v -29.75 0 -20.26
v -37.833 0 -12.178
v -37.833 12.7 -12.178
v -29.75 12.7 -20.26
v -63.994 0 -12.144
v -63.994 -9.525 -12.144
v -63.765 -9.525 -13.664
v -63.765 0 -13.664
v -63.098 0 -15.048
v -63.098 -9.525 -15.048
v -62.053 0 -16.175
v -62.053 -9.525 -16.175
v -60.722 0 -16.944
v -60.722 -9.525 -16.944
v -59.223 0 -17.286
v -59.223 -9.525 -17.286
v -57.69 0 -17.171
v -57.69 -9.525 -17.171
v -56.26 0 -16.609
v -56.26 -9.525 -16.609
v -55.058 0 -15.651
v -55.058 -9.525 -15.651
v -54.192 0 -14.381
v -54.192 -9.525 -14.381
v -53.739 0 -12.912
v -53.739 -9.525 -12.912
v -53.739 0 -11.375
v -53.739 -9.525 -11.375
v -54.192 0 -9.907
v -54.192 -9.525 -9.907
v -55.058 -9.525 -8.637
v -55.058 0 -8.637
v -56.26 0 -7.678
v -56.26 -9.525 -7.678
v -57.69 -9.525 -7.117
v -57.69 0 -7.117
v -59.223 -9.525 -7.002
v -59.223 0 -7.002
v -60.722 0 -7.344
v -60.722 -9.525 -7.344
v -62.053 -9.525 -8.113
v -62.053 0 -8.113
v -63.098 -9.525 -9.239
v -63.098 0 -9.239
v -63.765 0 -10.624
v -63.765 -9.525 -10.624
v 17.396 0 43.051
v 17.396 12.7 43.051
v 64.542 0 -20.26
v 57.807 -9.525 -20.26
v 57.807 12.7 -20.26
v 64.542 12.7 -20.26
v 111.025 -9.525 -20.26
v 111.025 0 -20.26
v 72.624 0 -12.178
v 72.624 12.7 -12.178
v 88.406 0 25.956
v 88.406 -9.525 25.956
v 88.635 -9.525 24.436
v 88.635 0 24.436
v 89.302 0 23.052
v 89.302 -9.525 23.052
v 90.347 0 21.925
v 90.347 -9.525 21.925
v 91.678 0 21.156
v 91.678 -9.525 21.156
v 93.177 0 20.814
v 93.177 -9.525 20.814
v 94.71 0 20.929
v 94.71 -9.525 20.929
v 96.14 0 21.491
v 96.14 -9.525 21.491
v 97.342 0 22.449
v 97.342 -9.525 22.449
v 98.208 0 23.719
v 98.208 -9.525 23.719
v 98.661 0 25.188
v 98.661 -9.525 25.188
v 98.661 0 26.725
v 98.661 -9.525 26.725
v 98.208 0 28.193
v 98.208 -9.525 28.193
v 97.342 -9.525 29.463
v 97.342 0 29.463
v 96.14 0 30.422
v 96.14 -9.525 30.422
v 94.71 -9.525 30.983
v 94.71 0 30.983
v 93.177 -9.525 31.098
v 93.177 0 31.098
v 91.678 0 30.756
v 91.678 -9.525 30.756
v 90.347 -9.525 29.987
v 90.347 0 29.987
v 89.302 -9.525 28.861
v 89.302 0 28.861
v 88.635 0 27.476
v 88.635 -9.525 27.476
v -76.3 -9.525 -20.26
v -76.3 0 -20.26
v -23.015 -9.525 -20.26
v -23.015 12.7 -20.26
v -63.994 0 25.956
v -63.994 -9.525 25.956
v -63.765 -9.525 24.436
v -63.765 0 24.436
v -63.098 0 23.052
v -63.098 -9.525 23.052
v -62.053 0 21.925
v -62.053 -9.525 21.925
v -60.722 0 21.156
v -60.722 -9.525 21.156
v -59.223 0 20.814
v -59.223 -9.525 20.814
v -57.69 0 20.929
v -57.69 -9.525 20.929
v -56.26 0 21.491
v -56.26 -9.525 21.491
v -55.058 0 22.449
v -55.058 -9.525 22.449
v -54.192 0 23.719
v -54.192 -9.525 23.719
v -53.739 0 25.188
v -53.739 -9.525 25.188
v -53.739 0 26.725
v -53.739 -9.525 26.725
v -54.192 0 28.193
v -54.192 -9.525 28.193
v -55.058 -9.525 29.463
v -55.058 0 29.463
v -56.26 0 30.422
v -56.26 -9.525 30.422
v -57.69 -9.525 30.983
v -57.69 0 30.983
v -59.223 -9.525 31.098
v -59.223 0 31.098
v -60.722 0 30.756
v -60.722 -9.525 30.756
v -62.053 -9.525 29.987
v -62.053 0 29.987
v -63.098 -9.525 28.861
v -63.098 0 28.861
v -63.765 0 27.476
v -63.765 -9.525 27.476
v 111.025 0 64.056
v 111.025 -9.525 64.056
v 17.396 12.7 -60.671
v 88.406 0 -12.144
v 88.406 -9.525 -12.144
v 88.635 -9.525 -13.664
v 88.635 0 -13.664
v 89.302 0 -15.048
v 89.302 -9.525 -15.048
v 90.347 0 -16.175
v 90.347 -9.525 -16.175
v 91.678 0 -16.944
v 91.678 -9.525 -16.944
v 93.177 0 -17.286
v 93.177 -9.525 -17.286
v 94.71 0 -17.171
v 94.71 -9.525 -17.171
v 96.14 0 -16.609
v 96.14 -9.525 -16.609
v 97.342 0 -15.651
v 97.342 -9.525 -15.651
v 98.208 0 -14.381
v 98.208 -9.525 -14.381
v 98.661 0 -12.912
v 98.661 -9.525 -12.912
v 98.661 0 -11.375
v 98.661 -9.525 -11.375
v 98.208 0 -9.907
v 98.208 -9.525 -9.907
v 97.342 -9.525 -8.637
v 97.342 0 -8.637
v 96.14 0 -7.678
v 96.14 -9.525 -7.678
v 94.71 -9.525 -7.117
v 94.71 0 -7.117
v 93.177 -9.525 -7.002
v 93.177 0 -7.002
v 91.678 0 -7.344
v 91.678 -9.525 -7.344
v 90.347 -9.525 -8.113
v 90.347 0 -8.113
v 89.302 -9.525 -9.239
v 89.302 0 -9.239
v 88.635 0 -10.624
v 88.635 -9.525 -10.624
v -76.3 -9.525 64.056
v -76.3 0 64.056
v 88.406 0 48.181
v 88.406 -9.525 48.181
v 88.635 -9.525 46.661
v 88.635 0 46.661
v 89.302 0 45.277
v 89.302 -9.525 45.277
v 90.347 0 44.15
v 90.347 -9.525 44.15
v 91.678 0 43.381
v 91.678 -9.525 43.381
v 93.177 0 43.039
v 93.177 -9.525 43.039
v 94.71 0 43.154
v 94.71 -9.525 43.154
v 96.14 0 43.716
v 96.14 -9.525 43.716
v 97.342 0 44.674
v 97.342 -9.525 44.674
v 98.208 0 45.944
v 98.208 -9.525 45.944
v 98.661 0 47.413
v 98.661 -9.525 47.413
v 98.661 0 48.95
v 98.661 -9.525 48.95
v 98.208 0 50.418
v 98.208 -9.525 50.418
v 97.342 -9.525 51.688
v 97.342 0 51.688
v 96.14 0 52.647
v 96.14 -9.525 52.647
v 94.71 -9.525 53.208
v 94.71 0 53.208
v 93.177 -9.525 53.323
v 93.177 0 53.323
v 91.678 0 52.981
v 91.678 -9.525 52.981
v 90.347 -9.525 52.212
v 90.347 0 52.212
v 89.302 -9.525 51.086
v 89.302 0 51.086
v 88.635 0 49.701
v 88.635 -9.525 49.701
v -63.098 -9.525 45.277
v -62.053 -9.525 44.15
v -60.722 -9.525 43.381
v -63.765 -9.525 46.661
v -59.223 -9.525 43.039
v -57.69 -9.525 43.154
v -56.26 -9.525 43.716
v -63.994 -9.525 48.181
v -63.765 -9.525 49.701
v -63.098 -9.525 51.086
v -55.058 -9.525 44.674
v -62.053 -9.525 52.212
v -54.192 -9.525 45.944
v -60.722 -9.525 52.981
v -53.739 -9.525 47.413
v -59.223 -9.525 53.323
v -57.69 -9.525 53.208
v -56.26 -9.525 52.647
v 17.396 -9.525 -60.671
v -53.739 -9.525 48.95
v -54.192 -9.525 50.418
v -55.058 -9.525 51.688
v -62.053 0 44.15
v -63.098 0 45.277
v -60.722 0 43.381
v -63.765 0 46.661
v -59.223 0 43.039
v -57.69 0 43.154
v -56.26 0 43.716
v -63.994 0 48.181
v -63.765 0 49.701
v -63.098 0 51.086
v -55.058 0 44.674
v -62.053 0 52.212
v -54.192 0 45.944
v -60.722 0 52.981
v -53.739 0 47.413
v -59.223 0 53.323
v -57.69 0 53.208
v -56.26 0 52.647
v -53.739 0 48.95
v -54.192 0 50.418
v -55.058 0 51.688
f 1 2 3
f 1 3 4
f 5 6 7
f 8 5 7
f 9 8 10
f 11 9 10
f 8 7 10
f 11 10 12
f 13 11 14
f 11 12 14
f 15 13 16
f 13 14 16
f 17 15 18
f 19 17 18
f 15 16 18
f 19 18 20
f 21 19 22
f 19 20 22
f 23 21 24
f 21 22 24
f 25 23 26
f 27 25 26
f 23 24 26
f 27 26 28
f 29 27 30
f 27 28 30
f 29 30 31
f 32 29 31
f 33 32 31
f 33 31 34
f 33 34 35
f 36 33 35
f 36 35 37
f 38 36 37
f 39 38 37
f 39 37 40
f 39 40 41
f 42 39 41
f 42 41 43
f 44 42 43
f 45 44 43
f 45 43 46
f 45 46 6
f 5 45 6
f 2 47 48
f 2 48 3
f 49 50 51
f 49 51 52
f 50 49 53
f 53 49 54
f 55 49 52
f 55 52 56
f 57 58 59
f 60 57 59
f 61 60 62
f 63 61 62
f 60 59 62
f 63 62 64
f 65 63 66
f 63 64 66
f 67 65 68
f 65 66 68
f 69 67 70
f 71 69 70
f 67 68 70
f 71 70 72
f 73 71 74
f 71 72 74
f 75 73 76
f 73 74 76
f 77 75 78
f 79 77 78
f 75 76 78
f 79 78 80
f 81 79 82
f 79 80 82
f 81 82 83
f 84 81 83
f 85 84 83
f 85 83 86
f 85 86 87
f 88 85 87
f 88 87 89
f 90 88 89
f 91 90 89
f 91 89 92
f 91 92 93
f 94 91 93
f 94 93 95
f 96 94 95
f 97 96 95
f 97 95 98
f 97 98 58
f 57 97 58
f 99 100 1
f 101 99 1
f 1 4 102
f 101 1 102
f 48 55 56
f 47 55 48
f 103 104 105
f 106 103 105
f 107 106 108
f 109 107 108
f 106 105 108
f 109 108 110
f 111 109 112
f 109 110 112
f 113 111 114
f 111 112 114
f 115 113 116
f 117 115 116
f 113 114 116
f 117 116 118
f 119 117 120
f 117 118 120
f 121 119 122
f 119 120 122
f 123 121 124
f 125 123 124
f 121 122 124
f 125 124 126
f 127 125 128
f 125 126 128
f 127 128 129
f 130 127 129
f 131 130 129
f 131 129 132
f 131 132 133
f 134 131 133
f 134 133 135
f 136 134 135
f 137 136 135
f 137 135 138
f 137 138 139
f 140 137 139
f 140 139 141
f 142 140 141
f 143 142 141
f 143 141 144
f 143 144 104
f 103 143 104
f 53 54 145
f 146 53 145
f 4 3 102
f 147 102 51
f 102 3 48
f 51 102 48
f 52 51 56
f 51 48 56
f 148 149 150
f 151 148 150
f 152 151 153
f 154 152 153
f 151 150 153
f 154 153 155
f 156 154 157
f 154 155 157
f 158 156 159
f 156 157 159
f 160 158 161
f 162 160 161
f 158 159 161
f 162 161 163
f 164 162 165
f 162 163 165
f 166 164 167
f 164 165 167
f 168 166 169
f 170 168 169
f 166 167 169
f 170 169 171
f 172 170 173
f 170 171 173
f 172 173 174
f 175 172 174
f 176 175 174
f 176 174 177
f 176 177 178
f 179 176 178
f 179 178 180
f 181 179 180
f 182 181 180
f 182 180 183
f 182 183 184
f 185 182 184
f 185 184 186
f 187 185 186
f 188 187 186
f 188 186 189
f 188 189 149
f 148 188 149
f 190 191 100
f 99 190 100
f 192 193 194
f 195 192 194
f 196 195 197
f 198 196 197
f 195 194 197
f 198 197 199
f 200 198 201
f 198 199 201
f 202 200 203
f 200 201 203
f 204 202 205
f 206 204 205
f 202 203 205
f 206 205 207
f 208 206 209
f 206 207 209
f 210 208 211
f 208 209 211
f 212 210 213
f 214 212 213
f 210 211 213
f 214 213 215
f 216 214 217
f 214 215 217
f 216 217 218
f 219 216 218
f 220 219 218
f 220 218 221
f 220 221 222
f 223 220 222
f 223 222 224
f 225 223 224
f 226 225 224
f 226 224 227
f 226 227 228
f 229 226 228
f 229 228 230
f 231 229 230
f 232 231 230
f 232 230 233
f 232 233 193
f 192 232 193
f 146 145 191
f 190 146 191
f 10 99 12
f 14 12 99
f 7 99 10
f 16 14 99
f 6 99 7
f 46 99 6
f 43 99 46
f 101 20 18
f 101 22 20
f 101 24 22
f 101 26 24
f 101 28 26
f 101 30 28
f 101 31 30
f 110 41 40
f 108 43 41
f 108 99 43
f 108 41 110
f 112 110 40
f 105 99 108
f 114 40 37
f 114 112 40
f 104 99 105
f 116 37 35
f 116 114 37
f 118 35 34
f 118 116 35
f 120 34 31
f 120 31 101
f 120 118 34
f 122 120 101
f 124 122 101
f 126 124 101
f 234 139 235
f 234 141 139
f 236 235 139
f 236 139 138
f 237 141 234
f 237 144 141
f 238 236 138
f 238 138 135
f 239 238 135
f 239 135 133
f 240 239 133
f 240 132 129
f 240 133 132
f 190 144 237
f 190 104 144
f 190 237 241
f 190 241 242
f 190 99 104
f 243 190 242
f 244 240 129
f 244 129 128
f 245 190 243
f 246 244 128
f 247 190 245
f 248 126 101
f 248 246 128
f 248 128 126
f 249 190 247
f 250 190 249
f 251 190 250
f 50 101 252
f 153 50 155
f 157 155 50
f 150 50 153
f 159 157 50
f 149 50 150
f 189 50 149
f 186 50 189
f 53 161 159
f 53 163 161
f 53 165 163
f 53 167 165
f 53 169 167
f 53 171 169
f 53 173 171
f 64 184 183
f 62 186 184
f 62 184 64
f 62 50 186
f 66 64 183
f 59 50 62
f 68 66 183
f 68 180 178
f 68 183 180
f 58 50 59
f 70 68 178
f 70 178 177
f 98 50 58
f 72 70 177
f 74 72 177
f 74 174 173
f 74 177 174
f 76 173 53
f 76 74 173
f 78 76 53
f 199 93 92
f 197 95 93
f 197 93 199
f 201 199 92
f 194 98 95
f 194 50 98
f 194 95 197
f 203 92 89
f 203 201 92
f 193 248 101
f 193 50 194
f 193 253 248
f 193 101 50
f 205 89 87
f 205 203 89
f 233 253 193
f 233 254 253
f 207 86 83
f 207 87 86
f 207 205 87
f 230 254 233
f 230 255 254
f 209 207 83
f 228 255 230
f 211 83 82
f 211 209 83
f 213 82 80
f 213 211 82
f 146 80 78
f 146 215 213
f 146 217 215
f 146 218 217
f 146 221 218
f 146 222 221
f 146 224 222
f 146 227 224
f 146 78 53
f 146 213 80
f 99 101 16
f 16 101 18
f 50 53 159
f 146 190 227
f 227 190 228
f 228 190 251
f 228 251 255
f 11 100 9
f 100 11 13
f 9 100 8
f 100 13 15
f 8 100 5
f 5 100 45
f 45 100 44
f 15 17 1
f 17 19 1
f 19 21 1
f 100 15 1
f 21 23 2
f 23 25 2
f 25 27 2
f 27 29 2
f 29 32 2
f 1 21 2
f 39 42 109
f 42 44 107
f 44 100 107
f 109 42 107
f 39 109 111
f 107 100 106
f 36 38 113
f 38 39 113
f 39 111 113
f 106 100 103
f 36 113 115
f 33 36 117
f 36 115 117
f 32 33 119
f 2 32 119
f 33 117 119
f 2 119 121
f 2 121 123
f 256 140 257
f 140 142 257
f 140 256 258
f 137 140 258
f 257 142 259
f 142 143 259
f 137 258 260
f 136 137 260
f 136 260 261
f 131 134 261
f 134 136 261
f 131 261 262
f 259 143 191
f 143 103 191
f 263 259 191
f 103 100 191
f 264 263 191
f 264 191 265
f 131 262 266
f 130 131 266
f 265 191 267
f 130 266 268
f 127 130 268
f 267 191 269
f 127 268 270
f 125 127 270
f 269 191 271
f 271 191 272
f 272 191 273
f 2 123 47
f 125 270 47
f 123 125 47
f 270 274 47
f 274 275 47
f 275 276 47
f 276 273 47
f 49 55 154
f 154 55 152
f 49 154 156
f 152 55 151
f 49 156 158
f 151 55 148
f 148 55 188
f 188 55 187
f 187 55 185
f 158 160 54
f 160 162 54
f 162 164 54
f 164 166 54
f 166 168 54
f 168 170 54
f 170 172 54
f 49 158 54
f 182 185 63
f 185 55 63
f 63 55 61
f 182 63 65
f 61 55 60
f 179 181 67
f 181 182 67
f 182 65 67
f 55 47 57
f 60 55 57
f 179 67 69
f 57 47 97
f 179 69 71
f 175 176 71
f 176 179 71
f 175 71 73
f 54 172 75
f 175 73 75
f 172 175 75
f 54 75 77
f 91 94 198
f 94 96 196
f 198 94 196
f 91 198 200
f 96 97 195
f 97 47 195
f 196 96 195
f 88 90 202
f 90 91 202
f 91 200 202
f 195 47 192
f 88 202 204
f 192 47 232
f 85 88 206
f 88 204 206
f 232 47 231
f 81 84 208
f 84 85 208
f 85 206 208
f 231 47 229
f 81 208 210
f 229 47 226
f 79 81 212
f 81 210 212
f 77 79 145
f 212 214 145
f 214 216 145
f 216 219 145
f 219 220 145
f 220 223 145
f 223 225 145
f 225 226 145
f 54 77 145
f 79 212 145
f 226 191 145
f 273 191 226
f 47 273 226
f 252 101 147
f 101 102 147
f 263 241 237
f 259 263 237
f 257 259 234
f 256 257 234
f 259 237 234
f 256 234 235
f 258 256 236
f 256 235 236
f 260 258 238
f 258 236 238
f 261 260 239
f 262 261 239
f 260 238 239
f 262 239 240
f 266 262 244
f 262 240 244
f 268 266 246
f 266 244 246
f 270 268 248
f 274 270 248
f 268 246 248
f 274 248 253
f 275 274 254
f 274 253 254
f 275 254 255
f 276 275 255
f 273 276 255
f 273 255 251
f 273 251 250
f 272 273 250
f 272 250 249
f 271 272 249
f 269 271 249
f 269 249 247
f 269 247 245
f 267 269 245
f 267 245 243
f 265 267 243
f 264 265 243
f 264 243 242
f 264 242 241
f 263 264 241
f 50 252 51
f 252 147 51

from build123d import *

# Parameters (mm, degrees)
F1_DEPTH = 12.7
F2_DEPTH = 9.525
F3_DEPTH = 9.525
F4_D     = 10.3124


with BuildPart() as f1:
    # F0 (on Front) → F1 (new body)
    with BuildSketch(Plane.XZ):
        Polygon((-37.8326816705, -12.1775942421), (-29.7504506663, -20.2598252463), (-23.0152595659, -20.2598252463), (17.3958929789, -60.6709777911), (57.8070455237, -20.2598252463), (64.5422376145, -20.2598252463), (72.6244686187, -12.1775942421), (17.3958934741, 43.0509809025), align=None)
    extrude(amount=-F1_DEPTH)

    # F0 (on Front) → F2 (join)
    with BuildSketch(Plane.XZ):
        Polygon((111.0247183502, 64.0561261252), (-76.3002816498, 64.0561261252), (-76.3002816498, -20.2598252463), (-29.7504506663, -20.2598252463), (-37.8326816705, -12.1775942421), (17.3958934741, 43.0509809025), (72.6244686187, -12.1775942421), (64.5422376145, -20.2598252463), (111.0247183502, -20.2598252463), align=None)
    extrude(amount=F2_DEPTH)

    # F0 (on Front) → F3 (join)
    with BuildSketch(Plane.XZ):
        Polygon((-37.8326816705, -12.1775942421), (-29.7504506663, -20.2598252463), (-23.0152595659, -20.2598252463), (17.3958929789, -60.6709777911), (57.8070455237, -20.2598252463), (64.5422376145, -20.2598252463), (72.6244686187, -12.1775942421), (17.3958934741, 43.0509809025), align=None)
    extrude(amount=F3_DEPTH)

    # F4 (through all)
    with Locations(Plane(origin=(0, 0, 0), x_dir=(1, 0, 0), z_dir=(0, 1, 0))):
        with Locations((-58.8377816498, -48.1811261252), (-58.8377816498, -25.9561261252), (-58.8377816498, 12.1438738748), (93.5622183502, -48.1811261252), (93.5622183502, -25.9561261252), (93.5622183502, 12.1438738748)):
            Hole(F4_D / 2)


solid = f1.part
